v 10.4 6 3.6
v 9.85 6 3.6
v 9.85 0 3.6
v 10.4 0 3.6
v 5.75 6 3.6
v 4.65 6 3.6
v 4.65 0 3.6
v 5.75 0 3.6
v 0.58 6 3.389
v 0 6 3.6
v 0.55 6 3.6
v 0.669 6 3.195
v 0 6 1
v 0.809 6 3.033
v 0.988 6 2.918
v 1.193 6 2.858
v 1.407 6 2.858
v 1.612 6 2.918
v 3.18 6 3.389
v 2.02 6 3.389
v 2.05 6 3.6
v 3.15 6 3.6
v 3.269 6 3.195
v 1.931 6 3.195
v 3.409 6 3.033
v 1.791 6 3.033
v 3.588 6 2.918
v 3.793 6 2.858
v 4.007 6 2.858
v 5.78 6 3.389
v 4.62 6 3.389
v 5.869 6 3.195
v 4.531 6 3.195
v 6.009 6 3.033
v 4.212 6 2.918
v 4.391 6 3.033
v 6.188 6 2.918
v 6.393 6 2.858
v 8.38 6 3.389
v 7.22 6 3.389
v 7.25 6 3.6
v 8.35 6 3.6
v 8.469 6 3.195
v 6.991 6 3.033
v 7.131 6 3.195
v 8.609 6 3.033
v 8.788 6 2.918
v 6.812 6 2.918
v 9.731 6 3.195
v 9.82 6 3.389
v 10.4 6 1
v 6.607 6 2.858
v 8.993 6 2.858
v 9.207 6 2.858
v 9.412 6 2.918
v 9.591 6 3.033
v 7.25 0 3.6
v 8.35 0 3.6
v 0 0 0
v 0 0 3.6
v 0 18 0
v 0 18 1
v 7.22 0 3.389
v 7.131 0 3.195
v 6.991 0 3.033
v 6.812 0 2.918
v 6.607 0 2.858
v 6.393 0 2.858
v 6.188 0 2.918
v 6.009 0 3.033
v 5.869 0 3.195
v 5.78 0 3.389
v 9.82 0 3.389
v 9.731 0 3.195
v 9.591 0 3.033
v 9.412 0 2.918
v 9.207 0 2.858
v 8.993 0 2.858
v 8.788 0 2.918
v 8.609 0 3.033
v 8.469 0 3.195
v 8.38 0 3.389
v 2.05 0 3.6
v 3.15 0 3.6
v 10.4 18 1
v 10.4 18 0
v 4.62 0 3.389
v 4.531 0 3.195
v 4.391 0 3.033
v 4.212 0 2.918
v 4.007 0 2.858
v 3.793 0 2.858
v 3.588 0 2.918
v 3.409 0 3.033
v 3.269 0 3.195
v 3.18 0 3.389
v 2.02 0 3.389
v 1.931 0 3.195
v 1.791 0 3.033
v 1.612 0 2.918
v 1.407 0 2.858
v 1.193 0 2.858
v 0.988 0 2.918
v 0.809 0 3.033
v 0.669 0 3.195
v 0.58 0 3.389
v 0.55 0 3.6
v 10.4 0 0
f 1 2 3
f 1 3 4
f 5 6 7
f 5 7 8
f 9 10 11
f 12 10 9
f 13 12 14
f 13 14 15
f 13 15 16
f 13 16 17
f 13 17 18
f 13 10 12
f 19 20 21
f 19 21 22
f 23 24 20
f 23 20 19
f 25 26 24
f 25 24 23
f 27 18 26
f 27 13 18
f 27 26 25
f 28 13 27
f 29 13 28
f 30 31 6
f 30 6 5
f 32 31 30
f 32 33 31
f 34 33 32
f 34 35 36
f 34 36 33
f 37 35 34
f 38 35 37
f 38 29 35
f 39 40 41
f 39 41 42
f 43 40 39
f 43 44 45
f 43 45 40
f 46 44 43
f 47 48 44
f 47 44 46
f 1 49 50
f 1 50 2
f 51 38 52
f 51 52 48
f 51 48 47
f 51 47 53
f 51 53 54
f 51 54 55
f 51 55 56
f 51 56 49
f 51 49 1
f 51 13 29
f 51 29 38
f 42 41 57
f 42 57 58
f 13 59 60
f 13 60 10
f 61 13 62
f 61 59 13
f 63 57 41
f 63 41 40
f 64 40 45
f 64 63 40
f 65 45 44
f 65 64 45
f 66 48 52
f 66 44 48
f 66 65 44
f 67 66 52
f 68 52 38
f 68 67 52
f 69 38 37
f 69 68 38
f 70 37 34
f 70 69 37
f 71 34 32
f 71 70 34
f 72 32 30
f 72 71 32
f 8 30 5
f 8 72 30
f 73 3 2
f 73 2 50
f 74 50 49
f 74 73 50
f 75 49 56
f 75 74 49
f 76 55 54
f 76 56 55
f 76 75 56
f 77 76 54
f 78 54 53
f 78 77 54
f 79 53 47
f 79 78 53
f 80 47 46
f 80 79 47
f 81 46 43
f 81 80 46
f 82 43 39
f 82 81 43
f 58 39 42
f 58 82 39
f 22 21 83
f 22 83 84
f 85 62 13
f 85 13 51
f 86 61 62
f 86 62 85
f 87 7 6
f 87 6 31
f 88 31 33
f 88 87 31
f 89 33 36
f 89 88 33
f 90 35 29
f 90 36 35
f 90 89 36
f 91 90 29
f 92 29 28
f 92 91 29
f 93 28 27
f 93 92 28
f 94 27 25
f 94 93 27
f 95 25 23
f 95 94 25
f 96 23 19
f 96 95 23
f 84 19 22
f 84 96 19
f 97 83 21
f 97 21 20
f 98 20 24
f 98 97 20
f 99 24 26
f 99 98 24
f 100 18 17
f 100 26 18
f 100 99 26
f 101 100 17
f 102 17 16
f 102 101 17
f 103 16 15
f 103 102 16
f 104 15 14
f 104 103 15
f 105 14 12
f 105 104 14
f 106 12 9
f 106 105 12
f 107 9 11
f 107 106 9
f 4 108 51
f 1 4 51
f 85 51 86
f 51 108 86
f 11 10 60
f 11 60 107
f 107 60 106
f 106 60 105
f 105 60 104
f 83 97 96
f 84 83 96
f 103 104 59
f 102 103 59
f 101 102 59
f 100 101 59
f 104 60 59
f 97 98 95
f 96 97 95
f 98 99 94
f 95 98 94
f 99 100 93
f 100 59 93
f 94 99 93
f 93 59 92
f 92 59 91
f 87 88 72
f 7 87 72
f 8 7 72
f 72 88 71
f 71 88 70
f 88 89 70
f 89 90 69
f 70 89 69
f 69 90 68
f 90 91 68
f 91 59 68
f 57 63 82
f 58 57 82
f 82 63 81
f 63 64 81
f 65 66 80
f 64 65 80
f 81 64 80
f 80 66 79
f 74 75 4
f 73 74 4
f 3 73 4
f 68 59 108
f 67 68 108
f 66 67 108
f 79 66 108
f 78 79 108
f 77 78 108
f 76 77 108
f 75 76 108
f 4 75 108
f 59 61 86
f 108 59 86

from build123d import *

# Parameters (mm, degrees)
BOX023_W          = 30
BOX023_H          = 20
BOX023_DEPTH      = 9.2
BOX007_W          = 26
BOX007_H          = 12
BOX007_DEPTH      = 5.2
CYLINDER002_R     = 0.75
CYLINDER002_DEPTH = 7
ARRAY002_X_COUNT  = 4
ARRAY002_X_PITCH  = 2.6
ARRAY002_Y_COUNT  = 2
ARRAY002_Y_PITCH  = 1
BOX_W             = 10.4
BOX_H             = 18
BOX_DEPTH         = 7.2


with BuildPart() as cortador007:
    # Box023 → Box023 (new body)
    with BuildSketch(Plane(origin=(-1, -2, 3.6), x_dir=(1, 0, 0), z_dir=(0, 0, 1))):
        with Locations((15, 10)):
            Rectangle(BOX023_W, BOX023_H)
    extrude(amount=BOX023_DEPTH)


with BuildPart() as cube_10_base004:
    # Box007 → Box007 (new body)
    with BuildSketch(Plane(origin=(0, 6, 1), x_dir=(1, 0, 0), z_dir=(0, 0, 1))):
        with Locations((13, 6)):
            Rectangle(BOX007_W, BOX007_H)
    extrude(amount=BOX007_DEPTH)


with BuildPart() as array002:
    # Cylinder002 → Cylinder002 (new body)
    with BuildSketch(Plane(origin=(1.3, -1, 3.6), x_dir=(1, 0, 0), z_dir=(0, 1, 0))):
        Circle(CYLINDER002_R)
    extrude(amount=CYLINDER002_DEPTH)

    # Array002 X: Array002 ×4


with BuildPart() as array002_1:
    add(array002.part)
    with Locations(*[(i * ARRAY002_X_PITCH, 0, 0) for i in range(1, ARRAY002_X_COUNT)]):
        add(array002.part)

    # Array002 Y: Array002 ×2


with BuildPart() as array002_2:
    add(array002_1.part)
    with Locations(*[(0, i * ARRAY002_Y_PITCH, 0) for i in range(1, ARRAY002_Y_COUNT)]):
        add(array002_1.part)


with BuildPart() as bloque4_abajo:
    # Box → Box (new body)
    with BuildSketch(Plane.XY):
        with Locations((5.2, 9)):
            Rectangle(BOX_W, BOX_H)
    extrude(amount=BOX_DEPTH)

    # Cut002: cut Array002
    add(array002_2.part, mode=Mode.SUBTRACT)

    # Cut006: cut cube_10_base004
    add(cube_10_base004.part, mode=Mode.SUBTRACT)

    # Cut019: cut cortador007
    add(cortador007.part, mode=Mode.SUBTRACT)


solid = bloque4_abajo.part
